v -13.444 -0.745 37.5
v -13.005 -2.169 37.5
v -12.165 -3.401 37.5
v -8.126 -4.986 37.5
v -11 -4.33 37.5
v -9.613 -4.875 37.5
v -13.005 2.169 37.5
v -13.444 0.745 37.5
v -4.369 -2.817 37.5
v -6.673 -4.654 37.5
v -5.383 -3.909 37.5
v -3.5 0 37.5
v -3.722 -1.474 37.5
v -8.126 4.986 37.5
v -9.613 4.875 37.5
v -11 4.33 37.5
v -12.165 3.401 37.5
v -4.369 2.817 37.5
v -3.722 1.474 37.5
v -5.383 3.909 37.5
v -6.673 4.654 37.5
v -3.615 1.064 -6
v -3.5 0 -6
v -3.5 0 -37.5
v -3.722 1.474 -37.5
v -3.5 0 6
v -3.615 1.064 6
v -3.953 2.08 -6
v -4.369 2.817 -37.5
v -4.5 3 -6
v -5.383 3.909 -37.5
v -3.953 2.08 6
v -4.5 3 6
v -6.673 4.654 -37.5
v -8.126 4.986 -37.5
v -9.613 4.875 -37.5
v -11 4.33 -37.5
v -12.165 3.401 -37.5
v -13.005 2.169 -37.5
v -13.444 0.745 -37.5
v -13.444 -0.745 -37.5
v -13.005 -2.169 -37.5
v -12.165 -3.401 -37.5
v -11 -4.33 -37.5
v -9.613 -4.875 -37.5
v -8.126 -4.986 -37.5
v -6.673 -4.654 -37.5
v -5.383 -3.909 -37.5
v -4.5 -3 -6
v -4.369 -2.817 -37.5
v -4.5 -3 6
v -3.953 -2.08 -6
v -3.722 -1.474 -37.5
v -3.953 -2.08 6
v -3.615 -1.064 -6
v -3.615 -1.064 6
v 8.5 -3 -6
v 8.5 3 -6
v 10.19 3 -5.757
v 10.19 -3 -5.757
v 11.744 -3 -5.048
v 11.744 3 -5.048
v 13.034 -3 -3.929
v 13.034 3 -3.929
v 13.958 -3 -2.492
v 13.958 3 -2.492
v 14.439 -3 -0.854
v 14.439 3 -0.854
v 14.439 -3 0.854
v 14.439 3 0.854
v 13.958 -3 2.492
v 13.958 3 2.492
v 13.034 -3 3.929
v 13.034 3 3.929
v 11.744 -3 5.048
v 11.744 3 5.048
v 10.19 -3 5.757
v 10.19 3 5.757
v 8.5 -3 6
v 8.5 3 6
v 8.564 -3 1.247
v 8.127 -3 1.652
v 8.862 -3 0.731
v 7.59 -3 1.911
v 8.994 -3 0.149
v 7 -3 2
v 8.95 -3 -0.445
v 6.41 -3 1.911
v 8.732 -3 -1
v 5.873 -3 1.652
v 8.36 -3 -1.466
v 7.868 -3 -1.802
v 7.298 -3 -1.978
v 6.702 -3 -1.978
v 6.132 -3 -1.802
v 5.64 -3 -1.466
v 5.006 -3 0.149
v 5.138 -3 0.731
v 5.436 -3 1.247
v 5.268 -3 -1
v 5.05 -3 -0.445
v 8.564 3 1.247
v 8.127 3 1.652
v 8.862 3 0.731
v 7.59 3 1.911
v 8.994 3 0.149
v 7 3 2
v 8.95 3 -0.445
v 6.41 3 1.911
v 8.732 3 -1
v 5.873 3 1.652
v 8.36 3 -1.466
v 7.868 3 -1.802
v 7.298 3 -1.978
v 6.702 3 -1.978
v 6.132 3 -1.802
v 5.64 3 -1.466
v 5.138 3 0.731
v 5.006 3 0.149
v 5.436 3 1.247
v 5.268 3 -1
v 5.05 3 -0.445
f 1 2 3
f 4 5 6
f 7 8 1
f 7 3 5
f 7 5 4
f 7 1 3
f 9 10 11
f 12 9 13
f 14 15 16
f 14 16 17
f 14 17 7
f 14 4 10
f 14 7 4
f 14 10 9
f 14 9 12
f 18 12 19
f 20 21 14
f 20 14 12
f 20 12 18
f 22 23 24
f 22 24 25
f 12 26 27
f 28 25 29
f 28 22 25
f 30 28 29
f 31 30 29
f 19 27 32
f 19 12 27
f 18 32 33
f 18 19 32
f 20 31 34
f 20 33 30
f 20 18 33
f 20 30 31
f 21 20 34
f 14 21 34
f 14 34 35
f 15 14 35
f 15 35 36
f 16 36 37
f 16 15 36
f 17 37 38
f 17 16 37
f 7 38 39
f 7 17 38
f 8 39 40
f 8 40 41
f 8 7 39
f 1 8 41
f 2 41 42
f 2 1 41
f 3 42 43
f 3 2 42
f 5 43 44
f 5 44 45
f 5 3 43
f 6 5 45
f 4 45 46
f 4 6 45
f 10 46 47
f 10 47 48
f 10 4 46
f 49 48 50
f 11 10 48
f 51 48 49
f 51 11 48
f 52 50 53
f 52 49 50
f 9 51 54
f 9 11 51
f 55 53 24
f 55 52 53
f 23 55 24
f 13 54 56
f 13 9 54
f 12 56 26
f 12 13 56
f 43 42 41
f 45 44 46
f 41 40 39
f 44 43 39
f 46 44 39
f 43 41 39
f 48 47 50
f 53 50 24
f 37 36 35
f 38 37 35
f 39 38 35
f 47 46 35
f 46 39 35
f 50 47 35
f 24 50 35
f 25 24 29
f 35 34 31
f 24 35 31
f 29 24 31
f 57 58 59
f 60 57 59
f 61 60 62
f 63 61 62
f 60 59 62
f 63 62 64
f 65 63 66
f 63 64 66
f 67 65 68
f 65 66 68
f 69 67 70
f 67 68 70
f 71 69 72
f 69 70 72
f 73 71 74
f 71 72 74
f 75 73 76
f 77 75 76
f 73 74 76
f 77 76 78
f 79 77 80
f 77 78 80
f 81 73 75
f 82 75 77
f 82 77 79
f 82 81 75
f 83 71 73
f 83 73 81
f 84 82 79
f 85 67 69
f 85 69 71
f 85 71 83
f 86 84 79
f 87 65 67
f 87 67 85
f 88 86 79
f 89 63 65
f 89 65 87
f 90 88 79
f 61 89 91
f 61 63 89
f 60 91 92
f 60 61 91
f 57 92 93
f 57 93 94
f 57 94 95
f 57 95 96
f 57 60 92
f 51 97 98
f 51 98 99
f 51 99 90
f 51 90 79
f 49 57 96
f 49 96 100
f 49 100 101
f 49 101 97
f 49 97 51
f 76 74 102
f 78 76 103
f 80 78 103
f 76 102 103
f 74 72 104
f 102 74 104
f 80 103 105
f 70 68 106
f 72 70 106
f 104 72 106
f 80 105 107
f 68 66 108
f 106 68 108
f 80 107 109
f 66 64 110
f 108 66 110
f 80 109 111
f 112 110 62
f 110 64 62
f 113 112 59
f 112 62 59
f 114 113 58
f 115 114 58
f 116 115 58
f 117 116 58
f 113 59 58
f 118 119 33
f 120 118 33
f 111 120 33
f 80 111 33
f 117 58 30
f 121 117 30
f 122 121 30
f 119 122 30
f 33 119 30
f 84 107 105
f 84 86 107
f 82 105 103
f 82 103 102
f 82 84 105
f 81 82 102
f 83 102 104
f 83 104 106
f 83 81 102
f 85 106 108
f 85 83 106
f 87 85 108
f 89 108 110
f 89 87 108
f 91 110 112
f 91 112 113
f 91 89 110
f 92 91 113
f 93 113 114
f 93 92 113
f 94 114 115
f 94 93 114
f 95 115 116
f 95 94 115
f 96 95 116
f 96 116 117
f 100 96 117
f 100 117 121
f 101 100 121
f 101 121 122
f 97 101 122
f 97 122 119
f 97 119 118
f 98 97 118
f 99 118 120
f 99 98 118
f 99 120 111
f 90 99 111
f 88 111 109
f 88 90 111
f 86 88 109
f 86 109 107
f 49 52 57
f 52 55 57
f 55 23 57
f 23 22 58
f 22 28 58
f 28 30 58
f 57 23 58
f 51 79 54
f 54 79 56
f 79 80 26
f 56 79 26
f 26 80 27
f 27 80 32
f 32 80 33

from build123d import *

# Parameters (mm, degrees)
SKETCH3_R           = 2
BOSS_EXTRUDE1_DEPTH = 3
SKETCH6_R           = 5
BOSS_EXTRUDE2_DEPTH = 37.5


with BuildPart() as part:
    # Sketch3 → Boss-Extrude1 (new, symmetric)
    with BuildSketch(Plane(origin=(0, 0, 0), x_dir=(1, 0, 0), z_dir=(0, 1, 0))):
        with BuildLine():
            Line((8.5, -6), (-8.5, -6))
            Line((-8.5, -6), (-8.5, 6))
            Line((-8.5, 6), (8.5, 6))
            ThreePointArc((8.5, 6), (14.5, 0), (8.5, -6))
        make_face()
        with Locations(Location((7, 0, 0), (0, 0, 270))):
            Circle(SKETCH3_R, mode=Mode.SUBTRACT)
    extrude(amount=BOSS_EXTRUDE1_DEPTH, both=True)

    # Sketch6 → Boss-Extrude2 (add, symmetric)
    with BuildSketch(Plane.XY):
        with Locations((-8.5, 0)):
            Circle(SKETCH6_R)
    extrude(amount=BOSS_EXTRUDE2_DEPTH, both=True)


solid = part.part
